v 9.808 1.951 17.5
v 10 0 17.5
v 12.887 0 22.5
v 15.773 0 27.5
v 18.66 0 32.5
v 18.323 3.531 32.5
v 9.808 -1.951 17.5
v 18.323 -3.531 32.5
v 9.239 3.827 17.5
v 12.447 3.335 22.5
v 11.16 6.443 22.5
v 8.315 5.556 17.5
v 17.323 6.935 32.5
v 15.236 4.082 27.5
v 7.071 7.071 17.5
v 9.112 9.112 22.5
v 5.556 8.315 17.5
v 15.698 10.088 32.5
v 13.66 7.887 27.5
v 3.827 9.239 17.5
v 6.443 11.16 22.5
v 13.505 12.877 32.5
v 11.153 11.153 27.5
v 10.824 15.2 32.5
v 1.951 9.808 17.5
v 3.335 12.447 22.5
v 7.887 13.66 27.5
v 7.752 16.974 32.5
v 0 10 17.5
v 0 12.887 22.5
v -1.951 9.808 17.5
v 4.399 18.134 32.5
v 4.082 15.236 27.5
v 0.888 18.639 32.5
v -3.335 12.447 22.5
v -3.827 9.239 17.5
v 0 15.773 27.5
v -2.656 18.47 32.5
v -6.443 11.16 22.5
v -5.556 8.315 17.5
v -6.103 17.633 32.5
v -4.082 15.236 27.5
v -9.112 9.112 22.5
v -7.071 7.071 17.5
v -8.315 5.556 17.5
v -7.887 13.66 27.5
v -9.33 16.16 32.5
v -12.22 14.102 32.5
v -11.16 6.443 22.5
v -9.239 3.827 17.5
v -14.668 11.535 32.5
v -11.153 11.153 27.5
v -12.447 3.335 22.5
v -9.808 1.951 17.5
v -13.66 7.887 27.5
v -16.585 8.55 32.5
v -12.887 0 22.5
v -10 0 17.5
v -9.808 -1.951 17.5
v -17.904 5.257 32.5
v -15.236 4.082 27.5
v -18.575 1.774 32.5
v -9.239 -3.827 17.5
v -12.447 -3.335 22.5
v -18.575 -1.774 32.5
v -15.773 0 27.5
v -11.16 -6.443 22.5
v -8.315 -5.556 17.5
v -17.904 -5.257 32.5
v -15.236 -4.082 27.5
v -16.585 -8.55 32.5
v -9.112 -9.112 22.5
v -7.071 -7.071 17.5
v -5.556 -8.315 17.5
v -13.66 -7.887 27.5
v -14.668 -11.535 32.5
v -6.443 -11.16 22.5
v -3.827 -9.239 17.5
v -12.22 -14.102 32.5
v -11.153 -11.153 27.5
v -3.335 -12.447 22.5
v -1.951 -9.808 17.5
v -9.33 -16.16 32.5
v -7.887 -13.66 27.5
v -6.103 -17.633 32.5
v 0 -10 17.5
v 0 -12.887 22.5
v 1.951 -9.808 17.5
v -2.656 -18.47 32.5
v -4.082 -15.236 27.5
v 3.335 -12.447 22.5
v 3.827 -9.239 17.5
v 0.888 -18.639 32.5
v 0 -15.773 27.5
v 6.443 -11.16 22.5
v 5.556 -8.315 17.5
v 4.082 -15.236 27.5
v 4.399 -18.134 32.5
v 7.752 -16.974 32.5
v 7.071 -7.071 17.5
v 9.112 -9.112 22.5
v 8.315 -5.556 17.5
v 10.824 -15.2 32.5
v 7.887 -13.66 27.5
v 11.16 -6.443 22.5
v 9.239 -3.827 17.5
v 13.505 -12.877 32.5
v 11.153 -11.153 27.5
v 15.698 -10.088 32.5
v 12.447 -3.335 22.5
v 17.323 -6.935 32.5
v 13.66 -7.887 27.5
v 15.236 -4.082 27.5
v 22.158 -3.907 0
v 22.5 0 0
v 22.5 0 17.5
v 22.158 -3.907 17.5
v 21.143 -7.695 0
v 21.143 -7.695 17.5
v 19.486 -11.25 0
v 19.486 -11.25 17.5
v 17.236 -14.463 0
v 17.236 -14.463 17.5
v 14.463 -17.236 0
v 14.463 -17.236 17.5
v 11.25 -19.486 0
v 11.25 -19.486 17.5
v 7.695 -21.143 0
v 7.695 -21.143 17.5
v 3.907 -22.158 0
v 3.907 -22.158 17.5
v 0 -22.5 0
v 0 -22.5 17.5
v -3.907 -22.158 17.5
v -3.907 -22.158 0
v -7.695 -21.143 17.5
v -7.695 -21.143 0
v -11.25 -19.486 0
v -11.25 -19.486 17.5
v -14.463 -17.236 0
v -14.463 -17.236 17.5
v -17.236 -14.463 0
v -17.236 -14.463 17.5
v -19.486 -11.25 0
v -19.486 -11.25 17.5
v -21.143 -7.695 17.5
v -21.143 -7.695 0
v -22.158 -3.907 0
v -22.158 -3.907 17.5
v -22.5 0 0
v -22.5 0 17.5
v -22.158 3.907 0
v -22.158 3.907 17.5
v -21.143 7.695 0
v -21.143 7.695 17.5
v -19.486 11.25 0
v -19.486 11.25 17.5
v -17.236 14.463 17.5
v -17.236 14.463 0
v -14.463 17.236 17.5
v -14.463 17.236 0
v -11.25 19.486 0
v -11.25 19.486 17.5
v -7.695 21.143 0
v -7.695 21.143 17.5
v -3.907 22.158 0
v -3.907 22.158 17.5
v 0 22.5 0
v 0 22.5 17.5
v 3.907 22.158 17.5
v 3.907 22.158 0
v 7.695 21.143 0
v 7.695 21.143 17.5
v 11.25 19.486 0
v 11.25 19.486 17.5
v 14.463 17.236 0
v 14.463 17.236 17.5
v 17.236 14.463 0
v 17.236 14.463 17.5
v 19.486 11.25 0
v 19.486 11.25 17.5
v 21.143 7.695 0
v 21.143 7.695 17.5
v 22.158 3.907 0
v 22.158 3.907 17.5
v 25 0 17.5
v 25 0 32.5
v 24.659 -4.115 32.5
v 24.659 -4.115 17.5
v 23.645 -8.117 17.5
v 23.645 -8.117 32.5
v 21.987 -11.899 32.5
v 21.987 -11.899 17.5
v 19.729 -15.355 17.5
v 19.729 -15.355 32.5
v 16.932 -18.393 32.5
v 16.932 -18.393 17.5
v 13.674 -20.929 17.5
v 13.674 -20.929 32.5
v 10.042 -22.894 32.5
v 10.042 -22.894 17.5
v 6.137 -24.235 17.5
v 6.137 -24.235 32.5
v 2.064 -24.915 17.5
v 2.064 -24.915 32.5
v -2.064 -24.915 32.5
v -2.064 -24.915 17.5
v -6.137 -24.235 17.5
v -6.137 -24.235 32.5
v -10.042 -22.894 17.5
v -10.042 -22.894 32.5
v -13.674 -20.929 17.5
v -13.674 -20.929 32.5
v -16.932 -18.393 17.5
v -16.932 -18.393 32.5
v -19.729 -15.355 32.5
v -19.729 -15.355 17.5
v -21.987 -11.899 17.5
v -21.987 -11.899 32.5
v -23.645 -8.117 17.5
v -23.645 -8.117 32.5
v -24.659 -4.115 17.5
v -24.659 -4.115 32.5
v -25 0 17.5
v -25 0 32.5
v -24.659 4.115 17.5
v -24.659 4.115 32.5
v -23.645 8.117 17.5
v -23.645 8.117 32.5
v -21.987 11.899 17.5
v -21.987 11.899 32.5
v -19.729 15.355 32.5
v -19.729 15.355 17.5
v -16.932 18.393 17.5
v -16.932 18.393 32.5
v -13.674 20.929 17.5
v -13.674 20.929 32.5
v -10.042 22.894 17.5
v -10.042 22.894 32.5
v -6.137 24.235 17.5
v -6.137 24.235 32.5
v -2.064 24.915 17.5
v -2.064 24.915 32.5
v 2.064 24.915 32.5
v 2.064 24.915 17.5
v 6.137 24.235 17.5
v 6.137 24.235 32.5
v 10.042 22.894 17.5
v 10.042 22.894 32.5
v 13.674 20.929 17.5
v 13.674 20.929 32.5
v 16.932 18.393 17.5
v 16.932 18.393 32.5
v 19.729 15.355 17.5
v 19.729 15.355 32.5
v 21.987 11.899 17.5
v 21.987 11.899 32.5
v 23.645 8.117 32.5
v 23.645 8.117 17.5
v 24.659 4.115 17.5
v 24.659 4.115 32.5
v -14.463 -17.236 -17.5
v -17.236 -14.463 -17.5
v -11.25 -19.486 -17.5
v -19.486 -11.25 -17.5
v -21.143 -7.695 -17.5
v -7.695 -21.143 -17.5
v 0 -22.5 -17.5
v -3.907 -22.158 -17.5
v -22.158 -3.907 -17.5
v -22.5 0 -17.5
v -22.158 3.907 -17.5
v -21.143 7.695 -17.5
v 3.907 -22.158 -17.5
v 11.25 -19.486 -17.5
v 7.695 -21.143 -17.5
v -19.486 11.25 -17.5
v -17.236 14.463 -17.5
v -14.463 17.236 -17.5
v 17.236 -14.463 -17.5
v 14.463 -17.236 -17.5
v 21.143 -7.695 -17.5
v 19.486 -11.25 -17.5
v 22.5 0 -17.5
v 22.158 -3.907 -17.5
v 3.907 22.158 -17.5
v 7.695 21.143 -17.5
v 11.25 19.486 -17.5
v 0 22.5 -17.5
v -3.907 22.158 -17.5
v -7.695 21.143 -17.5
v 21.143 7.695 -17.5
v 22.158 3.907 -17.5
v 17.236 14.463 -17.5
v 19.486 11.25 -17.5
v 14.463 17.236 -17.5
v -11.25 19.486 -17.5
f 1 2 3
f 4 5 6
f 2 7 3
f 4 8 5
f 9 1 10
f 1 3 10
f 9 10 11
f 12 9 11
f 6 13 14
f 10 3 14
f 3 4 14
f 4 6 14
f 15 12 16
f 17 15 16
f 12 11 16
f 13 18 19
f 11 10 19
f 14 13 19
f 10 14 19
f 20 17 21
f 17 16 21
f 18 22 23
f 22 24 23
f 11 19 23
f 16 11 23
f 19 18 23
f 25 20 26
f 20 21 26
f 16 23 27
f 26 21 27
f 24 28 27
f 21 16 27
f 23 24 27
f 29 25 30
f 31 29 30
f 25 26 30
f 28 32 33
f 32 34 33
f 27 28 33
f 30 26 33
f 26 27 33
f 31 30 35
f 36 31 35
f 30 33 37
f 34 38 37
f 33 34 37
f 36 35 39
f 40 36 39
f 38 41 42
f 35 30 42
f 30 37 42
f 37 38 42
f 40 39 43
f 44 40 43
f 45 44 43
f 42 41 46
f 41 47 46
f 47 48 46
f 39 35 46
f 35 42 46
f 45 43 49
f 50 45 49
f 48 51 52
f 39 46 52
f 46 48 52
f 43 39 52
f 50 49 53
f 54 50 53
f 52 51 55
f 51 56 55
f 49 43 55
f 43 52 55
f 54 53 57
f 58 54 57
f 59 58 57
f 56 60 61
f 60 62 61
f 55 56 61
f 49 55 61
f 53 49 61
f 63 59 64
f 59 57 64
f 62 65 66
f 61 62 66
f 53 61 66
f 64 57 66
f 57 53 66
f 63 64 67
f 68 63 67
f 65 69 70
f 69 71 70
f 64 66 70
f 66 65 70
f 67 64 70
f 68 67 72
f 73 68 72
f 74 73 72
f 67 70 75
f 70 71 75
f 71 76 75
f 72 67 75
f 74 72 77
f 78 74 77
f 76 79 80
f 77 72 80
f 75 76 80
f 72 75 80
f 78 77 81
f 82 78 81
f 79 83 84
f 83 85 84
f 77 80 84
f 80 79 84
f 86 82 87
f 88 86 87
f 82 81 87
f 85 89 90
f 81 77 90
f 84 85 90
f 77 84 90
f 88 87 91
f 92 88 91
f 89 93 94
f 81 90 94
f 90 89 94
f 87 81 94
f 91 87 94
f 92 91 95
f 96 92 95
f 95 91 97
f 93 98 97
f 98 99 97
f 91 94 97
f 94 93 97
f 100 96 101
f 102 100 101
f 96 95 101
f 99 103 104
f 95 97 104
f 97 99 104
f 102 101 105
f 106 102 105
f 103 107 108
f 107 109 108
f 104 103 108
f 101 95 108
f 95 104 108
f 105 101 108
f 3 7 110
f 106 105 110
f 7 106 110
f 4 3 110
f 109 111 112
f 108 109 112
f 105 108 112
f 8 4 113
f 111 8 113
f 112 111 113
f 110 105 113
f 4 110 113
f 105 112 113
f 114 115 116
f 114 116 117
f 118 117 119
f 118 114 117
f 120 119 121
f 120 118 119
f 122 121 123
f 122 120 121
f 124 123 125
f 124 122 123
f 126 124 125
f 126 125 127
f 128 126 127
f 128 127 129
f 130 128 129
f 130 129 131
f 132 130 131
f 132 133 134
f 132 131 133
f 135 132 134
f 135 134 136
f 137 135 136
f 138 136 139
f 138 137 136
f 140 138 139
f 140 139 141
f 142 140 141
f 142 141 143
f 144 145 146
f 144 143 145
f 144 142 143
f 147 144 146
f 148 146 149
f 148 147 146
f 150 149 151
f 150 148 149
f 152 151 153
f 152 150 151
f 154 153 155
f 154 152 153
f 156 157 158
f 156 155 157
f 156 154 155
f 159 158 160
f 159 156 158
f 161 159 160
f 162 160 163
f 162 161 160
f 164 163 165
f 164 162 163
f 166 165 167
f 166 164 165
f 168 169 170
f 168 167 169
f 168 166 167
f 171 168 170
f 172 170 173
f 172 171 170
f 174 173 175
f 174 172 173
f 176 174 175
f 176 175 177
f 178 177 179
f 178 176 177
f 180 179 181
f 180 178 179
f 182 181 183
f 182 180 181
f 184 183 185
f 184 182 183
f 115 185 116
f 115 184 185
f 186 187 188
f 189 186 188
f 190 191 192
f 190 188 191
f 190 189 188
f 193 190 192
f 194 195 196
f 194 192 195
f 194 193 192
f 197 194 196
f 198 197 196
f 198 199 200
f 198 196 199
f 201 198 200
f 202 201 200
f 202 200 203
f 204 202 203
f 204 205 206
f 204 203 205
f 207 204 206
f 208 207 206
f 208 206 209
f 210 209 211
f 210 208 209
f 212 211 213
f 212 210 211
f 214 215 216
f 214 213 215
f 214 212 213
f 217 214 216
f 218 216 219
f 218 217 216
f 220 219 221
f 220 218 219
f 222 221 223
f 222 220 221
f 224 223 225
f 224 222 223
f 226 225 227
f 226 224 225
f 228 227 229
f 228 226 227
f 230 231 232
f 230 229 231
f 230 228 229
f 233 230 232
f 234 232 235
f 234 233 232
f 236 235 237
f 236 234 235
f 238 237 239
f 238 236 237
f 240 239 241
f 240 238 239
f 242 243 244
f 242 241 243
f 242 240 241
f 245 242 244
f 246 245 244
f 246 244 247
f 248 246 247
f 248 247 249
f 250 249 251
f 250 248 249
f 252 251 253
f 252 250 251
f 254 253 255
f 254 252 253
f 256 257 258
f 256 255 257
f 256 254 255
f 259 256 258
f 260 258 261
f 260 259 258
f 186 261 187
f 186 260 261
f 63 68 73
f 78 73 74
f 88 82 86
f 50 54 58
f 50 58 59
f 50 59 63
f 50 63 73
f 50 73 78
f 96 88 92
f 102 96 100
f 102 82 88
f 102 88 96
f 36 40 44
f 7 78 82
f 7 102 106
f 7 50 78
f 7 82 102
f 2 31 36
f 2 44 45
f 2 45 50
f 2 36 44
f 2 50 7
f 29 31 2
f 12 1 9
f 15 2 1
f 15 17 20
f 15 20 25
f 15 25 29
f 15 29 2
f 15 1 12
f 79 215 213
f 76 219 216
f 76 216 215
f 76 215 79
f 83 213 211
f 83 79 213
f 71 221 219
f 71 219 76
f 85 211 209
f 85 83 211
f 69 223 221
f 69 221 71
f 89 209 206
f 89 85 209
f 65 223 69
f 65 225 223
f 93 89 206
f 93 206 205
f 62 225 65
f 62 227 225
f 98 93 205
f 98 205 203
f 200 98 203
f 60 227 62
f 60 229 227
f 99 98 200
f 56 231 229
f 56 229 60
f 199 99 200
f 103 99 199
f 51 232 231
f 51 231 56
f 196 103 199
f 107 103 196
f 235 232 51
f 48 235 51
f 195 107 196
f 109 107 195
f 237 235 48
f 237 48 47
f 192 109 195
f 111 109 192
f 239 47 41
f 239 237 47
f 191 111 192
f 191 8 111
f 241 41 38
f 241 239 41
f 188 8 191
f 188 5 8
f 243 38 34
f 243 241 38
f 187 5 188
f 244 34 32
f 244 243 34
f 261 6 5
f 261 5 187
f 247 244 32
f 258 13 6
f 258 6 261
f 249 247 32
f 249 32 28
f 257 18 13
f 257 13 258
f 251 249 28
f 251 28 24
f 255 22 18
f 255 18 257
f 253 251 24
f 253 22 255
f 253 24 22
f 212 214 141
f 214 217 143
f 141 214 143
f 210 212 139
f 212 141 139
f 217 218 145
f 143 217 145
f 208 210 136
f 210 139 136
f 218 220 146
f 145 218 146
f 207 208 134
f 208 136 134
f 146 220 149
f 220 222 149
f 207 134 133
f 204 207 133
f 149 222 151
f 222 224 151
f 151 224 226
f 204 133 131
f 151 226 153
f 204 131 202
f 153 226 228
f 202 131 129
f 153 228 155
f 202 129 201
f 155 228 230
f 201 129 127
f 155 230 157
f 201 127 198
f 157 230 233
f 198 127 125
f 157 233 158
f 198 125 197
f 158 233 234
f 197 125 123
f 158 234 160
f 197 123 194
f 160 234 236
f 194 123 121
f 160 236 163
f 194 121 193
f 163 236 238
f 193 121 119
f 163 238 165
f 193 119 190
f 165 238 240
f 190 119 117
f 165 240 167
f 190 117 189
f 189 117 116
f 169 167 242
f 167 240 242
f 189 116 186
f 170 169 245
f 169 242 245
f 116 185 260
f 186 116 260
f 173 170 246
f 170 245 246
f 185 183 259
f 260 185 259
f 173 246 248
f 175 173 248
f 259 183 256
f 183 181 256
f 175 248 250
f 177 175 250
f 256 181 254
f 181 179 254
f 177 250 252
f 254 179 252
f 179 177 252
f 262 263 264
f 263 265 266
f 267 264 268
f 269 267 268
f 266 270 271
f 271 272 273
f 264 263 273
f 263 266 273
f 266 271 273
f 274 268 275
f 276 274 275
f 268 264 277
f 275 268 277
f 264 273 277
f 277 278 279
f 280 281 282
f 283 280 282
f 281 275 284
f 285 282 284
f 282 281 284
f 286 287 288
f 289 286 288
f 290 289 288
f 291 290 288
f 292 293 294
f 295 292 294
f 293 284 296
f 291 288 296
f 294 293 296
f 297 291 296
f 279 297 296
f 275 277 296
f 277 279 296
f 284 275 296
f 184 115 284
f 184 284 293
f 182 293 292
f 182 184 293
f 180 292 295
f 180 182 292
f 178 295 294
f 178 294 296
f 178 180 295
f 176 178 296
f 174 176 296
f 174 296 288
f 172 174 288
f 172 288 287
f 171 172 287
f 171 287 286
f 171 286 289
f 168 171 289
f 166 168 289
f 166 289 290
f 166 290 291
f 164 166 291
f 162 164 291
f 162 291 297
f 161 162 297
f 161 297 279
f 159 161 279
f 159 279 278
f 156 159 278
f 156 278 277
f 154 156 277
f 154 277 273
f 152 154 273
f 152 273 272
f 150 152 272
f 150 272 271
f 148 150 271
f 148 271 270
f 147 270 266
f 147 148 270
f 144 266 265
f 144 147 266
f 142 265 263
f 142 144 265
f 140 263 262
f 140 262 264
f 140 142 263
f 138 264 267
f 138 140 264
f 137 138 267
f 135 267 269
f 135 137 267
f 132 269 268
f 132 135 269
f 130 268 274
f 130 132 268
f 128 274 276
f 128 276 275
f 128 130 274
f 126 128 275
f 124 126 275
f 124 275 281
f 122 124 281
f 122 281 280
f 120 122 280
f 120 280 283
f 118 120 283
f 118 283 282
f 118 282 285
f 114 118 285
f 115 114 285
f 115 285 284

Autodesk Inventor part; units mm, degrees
ref_plane "YZ Plane" through (0, 0, 0) normal (1, 0, 0) x (0, 1, 0)
ref_plane "XZ Plane" through (0, 0, 0) normal (0, 1, 0) x (-1, 0, 0)
ref_plane "XY Plane" through (0, 0, 0) normal (0, 0, 1) x (1, 0, 0)
sketch "Skizze1" plane through (0, 0, 0) normal (0, 0, 1) x (1, 0, 0)
  circle A0 centre (0, 0) radius 22.5
  dimension "d0" = 45
extrude "Extrusion1" add sketch "Skizze1" along normal mid plane 35
sketch "Skizze2" plane through (0, 0, 17.5) normal (0, 0, 1) x (1, 0, 0)
  circle A0 centre (0, 0) radius 22.5 projected
  circle A1 centre (0, 0) radius 25
  dimension "d3" = 50
extrude "Extrusion2" add sketch "Skizze2" along normal blind 15 contours A0 | A1
sketch "Skizze4" plane through (0, 0, 32.5) normal (0, 0, 1) x (1, 0, 0)
  circle A0 centre (0, 0) radius 25 projected
  circle A1 centre (0, 0) radius 10
  dimension "d6" = 20
extrude "Extrusion3" cut sketch "Skizze4" against normal blind 15 contours A1
chamfer "Fasen1" distance 15 angle 30 1 edges at (-10, 0, 32.5) measured on face at (9.9676, -0.8047, 22.5)
properties part number "Magnethalter"
